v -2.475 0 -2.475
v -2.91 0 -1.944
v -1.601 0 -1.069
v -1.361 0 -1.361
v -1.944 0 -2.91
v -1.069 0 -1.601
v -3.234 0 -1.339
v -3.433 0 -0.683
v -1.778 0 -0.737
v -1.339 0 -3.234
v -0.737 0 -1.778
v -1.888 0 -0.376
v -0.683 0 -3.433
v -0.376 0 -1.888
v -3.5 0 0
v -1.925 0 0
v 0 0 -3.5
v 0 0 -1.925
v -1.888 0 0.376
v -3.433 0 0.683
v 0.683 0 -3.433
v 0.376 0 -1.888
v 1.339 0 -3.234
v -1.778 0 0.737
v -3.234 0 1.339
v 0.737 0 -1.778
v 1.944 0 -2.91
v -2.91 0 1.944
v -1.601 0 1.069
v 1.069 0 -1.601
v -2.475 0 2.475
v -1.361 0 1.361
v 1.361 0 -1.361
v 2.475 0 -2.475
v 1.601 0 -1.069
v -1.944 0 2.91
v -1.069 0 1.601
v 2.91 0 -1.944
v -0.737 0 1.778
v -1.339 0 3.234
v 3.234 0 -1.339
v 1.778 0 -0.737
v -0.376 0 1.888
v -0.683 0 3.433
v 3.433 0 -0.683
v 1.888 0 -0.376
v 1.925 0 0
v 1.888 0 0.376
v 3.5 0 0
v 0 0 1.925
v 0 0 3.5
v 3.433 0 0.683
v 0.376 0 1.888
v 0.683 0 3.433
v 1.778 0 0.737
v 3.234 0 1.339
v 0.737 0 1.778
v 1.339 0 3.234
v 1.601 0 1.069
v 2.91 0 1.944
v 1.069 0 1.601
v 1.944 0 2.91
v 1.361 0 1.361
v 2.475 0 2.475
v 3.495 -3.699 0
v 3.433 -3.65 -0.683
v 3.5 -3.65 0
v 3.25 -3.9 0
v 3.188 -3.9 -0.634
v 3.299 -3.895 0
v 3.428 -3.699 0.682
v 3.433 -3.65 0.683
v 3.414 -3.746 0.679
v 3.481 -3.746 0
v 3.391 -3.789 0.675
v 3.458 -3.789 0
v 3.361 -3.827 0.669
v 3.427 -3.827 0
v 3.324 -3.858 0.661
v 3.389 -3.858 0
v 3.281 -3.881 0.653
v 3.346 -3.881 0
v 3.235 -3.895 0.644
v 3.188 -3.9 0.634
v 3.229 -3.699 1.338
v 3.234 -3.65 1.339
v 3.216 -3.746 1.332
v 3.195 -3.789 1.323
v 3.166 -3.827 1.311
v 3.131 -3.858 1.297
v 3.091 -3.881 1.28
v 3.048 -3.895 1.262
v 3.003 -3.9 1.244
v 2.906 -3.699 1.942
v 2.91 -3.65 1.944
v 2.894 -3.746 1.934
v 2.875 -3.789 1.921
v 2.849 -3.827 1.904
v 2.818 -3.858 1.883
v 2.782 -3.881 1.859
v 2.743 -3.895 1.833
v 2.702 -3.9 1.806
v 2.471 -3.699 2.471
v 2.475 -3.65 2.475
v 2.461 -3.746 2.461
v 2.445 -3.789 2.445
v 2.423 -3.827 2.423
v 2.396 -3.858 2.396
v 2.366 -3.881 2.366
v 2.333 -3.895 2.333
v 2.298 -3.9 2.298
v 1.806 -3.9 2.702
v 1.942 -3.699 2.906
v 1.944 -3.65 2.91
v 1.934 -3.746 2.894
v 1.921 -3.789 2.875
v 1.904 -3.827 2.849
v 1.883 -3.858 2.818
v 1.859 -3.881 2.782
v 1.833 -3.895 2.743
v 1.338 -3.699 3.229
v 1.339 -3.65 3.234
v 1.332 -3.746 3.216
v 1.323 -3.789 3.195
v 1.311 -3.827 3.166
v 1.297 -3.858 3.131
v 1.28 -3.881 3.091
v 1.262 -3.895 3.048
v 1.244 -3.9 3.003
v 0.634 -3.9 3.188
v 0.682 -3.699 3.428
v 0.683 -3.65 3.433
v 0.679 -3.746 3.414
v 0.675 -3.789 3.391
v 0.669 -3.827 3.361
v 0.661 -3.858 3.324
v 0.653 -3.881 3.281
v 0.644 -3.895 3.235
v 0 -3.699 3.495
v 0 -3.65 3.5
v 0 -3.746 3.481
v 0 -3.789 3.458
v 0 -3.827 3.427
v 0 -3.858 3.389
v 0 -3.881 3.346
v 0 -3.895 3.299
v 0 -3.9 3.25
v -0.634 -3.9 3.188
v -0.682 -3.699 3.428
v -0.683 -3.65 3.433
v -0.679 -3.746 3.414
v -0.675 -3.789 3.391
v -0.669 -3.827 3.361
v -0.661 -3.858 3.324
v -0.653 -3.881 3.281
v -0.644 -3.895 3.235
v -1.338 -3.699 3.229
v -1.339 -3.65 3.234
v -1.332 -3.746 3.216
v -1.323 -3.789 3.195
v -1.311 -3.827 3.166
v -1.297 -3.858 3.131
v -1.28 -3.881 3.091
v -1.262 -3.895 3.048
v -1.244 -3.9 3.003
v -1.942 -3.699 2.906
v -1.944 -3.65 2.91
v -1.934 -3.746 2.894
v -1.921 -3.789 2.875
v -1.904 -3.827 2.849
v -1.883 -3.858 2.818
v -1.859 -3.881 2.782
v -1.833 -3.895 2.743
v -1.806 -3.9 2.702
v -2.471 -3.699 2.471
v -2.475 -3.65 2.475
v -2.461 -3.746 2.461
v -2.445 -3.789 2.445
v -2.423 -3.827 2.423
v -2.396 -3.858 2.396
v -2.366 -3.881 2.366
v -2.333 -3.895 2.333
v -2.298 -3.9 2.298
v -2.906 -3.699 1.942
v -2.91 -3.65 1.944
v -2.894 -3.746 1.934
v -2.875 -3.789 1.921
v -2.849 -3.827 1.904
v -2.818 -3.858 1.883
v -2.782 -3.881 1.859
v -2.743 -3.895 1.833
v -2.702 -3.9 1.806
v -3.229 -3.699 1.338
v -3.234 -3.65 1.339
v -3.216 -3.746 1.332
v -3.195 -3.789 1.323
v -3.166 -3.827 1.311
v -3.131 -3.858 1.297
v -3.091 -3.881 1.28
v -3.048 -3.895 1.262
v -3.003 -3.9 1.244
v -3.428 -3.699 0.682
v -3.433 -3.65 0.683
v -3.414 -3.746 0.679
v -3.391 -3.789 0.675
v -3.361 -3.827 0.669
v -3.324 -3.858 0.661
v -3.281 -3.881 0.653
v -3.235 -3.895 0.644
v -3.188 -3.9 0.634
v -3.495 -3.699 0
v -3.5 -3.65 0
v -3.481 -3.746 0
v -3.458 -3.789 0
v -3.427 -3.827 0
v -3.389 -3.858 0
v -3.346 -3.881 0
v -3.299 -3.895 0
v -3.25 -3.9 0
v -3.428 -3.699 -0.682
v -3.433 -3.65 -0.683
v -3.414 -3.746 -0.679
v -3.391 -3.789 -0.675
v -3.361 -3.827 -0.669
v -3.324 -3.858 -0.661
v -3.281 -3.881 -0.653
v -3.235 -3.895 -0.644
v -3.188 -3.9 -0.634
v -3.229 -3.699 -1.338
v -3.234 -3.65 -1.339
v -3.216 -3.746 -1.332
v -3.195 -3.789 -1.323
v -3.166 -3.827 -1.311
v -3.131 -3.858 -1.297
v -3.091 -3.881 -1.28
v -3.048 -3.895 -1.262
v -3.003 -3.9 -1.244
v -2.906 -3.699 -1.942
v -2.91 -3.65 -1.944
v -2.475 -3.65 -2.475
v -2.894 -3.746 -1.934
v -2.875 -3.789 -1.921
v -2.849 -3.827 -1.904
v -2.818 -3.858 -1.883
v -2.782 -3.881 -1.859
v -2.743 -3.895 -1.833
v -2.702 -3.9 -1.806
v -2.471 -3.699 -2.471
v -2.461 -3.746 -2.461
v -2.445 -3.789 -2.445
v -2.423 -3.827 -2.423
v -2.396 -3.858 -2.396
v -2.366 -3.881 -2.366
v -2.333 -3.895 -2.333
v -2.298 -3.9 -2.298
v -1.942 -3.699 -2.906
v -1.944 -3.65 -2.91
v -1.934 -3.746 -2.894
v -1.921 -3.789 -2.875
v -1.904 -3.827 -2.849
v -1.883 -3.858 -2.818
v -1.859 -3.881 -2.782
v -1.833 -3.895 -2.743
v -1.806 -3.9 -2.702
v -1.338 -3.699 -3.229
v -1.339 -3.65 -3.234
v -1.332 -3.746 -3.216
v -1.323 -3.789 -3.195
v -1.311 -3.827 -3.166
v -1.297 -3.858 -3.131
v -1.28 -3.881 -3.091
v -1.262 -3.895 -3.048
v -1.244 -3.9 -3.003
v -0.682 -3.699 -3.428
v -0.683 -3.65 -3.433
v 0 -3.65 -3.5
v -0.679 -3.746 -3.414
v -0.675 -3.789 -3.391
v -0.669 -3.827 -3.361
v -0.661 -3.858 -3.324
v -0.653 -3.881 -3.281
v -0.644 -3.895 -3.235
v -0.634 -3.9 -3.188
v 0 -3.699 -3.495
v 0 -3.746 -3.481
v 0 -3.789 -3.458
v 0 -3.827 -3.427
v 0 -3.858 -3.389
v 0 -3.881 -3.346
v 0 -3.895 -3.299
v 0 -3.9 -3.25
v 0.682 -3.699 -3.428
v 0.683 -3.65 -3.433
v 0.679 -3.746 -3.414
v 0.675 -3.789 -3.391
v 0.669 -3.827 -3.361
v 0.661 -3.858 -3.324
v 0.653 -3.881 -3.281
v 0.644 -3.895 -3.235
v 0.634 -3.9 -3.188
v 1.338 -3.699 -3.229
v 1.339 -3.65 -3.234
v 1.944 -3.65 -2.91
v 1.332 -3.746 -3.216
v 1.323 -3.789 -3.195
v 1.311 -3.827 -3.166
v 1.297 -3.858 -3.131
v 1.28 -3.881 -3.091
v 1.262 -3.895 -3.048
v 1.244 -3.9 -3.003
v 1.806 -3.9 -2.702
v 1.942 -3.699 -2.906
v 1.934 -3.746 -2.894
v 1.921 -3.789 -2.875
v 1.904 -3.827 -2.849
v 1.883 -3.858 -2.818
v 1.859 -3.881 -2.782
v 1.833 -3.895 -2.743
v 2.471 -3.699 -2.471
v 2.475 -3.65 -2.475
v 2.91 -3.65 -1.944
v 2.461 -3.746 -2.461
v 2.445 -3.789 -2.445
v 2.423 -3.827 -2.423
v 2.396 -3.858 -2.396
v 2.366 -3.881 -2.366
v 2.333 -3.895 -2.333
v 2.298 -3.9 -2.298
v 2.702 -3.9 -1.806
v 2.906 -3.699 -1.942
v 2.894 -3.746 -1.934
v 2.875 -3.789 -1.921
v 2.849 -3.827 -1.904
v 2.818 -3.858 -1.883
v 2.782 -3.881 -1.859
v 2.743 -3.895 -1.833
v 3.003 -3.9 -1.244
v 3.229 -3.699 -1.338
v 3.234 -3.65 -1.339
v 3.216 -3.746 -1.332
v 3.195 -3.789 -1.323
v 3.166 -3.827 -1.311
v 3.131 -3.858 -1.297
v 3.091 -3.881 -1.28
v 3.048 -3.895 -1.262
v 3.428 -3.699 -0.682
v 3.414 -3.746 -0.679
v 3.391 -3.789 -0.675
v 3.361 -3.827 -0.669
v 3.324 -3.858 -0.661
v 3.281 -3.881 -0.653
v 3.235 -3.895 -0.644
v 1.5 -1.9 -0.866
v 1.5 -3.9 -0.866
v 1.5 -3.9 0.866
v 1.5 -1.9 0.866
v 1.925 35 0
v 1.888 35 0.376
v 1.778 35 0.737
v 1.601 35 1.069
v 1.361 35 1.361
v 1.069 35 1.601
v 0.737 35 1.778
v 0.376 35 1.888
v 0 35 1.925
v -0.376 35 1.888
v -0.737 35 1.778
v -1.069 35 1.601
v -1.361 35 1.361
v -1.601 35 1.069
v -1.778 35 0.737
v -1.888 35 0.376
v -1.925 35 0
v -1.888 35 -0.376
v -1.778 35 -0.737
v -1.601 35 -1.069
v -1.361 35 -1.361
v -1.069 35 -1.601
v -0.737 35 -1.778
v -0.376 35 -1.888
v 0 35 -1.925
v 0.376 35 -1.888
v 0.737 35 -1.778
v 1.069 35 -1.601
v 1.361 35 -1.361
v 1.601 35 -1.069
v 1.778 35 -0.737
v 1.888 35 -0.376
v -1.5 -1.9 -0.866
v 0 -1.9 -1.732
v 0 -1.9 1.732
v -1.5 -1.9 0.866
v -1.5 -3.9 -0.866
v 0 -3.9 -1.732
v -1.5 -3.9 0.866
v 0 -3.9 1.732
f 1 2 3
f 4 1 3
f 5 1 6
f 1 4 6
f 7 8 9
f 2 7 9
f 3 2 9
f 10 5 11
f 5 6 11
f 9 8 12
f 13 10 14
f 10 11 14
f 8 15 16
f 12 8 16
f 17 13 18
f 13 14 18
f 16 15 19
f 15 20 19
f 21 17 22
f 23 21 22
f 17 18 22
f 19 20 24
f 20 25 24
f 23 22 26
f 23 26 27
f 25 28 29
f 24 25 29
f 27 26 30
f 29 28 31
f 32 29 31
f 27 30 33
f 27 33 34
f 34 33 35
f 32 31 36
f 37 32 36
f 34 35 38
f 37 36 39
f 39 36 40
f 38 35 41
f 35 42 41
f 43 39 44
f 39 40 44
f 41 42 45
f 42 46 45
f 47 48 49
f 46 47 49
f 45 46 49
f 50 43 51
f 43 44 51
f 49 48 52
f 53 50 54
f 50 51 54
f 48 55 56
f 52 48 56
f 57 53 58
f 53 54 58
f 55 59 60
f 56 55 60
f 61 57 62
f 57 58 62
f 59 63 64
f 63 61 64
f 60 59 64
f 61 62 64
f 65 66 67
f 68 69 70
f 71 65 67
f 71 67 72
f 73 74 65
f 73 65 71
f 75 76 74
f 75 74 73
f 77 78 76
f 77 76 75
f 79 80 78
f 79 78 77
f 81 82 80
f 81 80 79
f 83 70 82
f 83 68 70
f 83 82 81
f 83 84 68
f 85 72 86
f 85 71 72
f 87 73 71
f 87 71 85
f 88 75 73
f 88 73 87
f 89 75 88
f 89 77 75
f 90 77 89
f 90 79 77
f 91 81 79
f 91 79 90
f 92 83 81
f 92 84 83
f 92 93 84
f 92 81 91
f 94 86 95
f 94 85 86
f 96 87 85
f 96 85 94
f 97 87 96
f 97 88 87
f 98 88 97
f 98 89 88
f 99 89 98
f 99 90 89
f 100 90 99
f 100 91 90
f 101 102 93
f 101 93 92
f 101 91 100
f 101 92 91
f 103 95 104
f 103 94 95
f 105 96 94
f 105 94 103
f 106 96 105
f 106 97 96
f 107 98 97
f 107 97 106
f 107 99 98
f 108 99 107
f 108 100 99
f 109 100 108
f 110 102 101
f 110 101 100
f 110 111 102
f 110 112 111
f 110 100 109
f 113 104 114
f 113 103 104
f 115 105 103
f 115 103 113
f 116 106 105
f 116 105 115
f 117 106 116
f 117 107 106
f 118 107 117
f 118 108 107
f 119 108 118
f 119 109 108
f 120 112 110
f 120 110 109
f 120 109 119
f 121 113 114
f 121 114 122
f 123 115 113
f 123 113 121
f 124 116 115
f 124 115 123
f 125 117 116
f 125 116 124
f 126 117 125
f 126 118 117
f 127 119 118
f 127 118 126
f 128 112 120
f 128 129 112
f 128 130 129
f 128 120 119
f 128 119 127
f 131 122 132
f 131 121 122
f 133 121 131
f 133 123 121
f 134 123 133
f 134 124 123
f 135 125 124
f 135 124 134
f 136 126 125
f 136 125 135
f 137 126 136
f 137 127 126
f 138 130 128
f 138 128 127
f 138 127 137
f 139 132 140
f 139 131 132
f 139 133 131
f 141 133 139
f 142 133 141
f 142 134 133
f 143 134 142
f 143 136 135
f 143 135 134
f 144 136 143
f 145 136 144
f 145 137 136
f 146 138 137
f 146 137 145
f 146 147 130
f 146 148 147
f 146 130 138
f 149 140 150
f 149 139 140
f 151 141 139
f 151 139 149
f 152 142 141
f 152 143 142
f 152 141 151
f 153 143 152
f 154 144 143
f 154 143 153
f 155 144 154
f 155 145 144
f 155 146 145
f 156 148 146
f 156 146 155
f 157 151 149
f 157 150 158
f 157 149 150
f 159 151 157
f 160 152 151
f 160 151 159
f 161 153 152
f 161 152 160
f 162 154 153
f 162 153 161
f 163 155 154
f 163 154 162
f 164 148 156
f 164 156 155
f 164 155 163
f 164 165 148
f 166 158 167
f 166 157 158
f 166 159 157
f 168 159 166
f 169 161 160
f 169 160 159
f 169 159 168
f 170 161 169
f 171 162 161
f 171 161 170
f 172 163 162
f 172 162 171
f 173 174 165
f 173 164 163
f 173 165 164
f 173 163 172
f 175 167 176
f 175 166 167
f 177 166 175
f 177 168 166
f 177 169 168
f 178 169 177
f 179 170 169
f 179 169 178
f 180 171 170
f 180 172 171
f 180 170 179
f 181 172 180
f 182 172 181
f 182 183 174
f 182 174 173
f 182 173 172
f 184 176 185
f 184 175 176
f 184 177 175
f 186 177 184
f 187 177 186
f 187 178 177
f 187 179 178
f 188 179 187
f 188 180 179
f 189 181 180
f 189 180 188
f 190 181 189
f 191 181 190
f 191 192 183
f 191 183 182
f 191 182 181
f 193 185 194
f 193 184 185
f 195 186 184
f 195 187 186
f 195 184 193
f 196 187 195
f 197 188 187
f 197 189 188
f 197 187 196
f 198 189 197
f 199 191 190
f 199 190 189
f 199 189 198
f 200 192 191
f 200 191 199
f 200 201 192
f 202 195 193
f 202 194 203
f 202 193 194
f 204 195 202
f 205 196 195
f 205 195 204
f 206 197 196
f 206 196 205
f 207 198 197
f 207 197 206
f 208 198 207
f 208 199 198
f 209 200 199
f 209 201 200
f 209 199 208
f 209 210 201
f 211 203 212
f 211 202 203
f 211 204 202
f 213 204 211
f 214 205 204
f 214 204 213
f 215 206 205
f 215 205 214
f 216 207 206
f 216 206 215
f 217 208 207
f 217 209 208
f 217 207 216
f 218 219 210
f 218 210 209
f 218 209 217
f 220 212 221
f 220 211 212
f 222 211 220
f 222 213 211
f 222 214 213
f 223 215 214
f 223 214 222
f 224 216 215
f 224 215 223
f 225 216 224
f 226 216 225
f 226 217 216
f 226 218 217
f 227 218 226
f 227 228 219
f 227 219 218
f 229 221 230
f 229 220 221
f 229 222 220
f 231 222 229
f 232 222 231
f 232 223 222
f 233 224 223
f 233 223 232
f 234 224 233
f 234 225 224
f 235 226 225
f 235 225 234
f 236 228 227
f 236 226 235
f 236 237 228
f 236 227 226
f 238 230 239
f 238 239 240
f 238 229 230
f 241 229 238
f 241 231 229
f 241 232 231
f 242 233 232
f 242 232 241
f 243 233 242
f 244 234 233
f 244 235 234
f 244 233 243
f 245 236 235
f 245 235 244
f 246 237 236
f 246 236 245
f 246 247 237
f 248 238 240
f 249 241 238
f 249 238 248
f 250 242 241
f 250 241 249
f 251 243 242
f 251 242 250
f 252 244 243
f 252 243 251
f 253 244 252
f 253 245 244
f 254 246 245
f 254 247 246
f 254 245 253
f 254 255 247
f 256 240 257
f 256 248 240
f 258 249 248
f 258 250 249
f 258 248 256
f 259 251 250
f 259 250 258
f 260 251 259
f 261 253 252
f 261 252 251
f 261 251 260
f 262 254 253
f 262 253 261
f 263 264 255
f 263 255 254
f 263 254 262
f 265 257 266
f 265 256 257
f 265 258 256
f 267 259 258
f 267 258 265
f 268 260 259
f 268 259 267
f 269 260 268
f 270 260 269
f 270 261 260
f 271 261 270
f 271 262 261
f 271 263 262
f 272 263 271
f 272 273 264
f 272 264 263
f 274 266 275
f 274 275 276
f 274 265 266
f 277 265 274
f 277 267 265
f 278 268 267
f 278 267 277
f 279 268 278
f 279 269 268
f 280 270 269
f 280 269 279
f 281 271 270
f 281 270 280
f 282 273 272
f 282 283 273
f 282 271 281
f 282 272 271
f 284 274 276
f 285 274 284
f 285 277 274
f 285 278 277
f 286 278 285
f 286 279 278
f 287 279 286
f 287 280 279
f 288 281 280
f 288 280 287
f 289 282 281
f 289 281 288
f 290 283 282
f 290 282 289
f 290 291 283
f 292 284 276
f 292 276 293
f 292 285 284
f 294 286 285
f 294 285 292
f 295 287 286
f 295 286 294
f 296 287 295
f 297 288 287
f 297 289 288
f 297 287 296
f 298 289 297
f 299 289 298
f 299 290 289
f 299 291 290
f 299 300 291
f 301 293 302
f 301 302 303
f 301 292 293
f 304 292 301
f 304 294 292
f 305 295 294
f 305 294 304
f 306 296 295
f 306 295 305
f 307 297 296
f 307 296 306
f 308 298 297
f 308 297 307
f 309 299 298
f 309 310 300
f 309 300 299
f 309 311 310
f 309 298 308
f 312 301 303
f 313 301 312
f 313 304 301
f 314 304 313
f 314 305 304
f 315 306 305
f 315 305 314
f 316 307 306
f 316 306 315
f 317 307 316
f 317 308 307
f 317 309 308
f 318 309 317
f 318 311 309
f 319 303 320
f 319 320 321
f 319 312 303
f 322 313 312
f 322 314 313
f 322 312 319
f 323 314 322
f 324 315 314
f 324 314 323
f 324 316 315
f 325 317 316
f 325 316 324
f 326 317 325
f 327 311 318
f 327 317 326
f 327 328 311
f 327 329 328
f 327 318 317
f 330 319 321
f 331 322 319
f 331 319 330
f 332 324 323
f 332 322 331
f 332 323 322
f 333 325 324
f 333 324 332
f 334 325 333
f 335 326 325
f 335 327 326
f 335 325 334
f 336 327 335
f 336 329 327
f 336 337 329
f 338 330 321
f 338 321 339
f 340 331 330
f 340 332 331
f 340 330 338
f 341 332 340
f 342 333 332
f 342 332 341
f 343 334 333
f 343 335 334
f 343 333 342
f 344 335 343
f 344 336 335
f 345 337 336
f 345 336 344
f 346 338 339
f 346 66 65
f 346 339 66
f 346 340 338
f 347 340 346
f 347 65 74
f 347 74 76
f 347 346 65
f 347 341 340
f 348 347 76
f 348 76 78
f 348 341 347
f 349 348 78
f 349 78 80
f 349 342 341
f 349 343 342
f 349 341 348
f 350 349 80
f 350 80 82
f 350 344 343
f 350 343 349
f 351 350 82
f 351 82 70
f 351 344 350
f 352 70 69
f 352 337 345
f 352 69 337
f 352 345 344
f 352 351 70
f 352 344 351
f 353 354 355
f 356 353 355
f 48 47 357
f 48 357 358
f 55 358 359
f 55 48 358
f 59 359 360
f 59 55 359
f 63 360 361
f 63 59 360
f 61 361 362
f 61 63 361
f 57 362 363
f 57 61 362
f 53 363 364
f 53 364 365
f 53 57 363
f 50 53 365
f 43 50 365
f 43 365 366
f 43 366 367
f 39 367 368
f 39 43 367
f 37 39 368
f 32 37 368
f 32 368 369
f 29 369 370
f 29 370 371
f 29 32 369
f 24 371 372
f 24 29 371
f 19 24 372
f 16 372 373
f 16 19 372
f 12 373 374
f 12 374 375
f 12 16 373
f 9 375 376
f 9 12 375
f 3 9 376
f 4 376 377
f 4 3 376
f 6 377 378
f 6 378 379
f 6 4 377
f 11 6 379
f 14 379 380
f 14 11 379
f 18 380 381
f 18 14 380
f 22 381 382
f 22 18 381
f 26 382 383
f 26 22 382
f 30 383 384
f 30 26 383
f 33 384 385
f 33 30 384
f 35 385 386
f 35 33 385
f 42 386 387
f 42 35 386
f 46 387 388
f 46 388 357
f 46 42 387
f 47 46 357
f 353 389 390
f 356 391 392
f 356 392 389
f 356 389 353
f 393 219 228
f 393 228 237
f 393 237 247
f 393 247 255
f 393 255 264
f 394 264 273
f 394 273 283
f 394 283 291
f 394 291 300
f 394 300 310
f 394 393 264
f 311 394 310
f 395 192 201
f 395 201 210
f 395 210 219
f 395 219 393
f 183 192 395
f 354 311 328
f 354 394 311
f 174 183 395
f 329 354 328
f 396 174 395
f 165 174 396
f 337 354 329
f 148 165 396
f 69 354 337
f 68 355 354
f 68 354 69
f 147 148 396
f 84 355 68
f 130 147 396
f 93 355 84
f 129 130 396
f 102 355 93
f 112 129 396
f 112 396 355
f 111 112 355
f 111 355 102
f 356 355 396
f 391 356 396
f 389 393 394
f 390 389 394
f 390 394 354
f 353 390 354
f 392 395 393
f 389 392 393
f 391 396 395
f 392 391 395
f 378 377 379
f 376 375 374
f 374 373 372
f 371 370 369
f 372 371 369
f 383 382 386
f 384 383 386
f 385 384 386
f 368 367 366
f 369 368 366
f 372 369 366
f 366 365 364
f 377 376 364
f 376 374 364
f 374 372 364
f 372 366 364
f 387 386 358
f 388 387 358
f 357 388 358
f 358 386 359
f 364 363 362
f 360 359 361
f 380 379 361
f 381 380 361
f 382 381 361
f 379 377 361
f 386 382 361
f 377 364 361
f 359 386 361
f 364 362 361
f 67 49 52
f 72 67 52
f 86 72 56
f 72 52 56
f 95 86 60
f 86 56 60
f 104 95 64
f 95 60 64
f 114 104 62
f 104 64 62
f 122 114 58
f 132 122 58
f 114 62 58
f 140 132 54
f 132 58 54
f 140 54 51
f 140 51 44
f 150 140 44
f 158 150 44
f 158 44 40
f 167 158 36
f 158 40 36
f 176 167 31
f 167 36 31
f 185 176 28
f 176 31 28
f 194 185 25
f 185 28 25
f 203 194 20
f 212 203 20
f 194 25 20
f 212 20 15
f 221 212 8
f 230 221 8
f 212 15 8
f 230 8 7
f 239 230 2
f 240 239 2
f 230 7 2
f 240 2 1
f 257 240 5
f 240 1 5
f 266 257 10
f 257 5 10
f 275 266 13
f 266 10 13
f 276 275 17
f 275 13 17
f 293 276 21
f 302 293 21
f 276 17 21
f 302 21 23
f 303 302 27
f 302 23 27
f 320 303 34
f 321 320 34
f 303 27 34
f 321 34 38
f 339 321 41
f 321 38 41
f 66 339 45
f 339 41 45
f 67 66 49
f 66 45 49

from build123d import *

# Parameters (mm, degrees)
F0_R     = 3.5
F0_R_2   = 1.925
F1_DEPTH = 3.9
F2_DEPTH = 35
F4_DEPTH = 2
F5_R     = 0.25


with BuildPart() as f1:
    # F0 (on Front) → F1 (new body)
    with BuildSketch(Plane.XZ):
        Circle(F0_R)
        Circle(F0_R_2, mode=Mode.SUBTRACT)
        Circle(F0_R_2)
    extrude(amount=F1_DEPTH)

    # F0 (on Front) → F2 (join)
    with BuildSketch(Plane.XZ):
        Circle(F0_R_2)
    extrude(amount=-F2_DEPTH)

    # F3 (on face) → F4 (cut)
    with BuildSketch(Plane.XZ.offset(3.9)):
        Polygon((1.5, -0.8660254038), (1.5, 0.8660254038), (0, 1.7320508076), (-1.5, 0.8660254038), (-1.5, -0.8660254038), (0, -1.7320508076), align=None)
    extrude(amount=-F4_DEPTH, mode=Mode.SUBTRACT)

    # F5
    f5_edges = [f1.edges().sort_by_distance(p)[0] for p in [
        (-3.5, -3.9, 0),
    ]]
    fillet(f5_edges, radius=F5_R)


solid = f1.part
